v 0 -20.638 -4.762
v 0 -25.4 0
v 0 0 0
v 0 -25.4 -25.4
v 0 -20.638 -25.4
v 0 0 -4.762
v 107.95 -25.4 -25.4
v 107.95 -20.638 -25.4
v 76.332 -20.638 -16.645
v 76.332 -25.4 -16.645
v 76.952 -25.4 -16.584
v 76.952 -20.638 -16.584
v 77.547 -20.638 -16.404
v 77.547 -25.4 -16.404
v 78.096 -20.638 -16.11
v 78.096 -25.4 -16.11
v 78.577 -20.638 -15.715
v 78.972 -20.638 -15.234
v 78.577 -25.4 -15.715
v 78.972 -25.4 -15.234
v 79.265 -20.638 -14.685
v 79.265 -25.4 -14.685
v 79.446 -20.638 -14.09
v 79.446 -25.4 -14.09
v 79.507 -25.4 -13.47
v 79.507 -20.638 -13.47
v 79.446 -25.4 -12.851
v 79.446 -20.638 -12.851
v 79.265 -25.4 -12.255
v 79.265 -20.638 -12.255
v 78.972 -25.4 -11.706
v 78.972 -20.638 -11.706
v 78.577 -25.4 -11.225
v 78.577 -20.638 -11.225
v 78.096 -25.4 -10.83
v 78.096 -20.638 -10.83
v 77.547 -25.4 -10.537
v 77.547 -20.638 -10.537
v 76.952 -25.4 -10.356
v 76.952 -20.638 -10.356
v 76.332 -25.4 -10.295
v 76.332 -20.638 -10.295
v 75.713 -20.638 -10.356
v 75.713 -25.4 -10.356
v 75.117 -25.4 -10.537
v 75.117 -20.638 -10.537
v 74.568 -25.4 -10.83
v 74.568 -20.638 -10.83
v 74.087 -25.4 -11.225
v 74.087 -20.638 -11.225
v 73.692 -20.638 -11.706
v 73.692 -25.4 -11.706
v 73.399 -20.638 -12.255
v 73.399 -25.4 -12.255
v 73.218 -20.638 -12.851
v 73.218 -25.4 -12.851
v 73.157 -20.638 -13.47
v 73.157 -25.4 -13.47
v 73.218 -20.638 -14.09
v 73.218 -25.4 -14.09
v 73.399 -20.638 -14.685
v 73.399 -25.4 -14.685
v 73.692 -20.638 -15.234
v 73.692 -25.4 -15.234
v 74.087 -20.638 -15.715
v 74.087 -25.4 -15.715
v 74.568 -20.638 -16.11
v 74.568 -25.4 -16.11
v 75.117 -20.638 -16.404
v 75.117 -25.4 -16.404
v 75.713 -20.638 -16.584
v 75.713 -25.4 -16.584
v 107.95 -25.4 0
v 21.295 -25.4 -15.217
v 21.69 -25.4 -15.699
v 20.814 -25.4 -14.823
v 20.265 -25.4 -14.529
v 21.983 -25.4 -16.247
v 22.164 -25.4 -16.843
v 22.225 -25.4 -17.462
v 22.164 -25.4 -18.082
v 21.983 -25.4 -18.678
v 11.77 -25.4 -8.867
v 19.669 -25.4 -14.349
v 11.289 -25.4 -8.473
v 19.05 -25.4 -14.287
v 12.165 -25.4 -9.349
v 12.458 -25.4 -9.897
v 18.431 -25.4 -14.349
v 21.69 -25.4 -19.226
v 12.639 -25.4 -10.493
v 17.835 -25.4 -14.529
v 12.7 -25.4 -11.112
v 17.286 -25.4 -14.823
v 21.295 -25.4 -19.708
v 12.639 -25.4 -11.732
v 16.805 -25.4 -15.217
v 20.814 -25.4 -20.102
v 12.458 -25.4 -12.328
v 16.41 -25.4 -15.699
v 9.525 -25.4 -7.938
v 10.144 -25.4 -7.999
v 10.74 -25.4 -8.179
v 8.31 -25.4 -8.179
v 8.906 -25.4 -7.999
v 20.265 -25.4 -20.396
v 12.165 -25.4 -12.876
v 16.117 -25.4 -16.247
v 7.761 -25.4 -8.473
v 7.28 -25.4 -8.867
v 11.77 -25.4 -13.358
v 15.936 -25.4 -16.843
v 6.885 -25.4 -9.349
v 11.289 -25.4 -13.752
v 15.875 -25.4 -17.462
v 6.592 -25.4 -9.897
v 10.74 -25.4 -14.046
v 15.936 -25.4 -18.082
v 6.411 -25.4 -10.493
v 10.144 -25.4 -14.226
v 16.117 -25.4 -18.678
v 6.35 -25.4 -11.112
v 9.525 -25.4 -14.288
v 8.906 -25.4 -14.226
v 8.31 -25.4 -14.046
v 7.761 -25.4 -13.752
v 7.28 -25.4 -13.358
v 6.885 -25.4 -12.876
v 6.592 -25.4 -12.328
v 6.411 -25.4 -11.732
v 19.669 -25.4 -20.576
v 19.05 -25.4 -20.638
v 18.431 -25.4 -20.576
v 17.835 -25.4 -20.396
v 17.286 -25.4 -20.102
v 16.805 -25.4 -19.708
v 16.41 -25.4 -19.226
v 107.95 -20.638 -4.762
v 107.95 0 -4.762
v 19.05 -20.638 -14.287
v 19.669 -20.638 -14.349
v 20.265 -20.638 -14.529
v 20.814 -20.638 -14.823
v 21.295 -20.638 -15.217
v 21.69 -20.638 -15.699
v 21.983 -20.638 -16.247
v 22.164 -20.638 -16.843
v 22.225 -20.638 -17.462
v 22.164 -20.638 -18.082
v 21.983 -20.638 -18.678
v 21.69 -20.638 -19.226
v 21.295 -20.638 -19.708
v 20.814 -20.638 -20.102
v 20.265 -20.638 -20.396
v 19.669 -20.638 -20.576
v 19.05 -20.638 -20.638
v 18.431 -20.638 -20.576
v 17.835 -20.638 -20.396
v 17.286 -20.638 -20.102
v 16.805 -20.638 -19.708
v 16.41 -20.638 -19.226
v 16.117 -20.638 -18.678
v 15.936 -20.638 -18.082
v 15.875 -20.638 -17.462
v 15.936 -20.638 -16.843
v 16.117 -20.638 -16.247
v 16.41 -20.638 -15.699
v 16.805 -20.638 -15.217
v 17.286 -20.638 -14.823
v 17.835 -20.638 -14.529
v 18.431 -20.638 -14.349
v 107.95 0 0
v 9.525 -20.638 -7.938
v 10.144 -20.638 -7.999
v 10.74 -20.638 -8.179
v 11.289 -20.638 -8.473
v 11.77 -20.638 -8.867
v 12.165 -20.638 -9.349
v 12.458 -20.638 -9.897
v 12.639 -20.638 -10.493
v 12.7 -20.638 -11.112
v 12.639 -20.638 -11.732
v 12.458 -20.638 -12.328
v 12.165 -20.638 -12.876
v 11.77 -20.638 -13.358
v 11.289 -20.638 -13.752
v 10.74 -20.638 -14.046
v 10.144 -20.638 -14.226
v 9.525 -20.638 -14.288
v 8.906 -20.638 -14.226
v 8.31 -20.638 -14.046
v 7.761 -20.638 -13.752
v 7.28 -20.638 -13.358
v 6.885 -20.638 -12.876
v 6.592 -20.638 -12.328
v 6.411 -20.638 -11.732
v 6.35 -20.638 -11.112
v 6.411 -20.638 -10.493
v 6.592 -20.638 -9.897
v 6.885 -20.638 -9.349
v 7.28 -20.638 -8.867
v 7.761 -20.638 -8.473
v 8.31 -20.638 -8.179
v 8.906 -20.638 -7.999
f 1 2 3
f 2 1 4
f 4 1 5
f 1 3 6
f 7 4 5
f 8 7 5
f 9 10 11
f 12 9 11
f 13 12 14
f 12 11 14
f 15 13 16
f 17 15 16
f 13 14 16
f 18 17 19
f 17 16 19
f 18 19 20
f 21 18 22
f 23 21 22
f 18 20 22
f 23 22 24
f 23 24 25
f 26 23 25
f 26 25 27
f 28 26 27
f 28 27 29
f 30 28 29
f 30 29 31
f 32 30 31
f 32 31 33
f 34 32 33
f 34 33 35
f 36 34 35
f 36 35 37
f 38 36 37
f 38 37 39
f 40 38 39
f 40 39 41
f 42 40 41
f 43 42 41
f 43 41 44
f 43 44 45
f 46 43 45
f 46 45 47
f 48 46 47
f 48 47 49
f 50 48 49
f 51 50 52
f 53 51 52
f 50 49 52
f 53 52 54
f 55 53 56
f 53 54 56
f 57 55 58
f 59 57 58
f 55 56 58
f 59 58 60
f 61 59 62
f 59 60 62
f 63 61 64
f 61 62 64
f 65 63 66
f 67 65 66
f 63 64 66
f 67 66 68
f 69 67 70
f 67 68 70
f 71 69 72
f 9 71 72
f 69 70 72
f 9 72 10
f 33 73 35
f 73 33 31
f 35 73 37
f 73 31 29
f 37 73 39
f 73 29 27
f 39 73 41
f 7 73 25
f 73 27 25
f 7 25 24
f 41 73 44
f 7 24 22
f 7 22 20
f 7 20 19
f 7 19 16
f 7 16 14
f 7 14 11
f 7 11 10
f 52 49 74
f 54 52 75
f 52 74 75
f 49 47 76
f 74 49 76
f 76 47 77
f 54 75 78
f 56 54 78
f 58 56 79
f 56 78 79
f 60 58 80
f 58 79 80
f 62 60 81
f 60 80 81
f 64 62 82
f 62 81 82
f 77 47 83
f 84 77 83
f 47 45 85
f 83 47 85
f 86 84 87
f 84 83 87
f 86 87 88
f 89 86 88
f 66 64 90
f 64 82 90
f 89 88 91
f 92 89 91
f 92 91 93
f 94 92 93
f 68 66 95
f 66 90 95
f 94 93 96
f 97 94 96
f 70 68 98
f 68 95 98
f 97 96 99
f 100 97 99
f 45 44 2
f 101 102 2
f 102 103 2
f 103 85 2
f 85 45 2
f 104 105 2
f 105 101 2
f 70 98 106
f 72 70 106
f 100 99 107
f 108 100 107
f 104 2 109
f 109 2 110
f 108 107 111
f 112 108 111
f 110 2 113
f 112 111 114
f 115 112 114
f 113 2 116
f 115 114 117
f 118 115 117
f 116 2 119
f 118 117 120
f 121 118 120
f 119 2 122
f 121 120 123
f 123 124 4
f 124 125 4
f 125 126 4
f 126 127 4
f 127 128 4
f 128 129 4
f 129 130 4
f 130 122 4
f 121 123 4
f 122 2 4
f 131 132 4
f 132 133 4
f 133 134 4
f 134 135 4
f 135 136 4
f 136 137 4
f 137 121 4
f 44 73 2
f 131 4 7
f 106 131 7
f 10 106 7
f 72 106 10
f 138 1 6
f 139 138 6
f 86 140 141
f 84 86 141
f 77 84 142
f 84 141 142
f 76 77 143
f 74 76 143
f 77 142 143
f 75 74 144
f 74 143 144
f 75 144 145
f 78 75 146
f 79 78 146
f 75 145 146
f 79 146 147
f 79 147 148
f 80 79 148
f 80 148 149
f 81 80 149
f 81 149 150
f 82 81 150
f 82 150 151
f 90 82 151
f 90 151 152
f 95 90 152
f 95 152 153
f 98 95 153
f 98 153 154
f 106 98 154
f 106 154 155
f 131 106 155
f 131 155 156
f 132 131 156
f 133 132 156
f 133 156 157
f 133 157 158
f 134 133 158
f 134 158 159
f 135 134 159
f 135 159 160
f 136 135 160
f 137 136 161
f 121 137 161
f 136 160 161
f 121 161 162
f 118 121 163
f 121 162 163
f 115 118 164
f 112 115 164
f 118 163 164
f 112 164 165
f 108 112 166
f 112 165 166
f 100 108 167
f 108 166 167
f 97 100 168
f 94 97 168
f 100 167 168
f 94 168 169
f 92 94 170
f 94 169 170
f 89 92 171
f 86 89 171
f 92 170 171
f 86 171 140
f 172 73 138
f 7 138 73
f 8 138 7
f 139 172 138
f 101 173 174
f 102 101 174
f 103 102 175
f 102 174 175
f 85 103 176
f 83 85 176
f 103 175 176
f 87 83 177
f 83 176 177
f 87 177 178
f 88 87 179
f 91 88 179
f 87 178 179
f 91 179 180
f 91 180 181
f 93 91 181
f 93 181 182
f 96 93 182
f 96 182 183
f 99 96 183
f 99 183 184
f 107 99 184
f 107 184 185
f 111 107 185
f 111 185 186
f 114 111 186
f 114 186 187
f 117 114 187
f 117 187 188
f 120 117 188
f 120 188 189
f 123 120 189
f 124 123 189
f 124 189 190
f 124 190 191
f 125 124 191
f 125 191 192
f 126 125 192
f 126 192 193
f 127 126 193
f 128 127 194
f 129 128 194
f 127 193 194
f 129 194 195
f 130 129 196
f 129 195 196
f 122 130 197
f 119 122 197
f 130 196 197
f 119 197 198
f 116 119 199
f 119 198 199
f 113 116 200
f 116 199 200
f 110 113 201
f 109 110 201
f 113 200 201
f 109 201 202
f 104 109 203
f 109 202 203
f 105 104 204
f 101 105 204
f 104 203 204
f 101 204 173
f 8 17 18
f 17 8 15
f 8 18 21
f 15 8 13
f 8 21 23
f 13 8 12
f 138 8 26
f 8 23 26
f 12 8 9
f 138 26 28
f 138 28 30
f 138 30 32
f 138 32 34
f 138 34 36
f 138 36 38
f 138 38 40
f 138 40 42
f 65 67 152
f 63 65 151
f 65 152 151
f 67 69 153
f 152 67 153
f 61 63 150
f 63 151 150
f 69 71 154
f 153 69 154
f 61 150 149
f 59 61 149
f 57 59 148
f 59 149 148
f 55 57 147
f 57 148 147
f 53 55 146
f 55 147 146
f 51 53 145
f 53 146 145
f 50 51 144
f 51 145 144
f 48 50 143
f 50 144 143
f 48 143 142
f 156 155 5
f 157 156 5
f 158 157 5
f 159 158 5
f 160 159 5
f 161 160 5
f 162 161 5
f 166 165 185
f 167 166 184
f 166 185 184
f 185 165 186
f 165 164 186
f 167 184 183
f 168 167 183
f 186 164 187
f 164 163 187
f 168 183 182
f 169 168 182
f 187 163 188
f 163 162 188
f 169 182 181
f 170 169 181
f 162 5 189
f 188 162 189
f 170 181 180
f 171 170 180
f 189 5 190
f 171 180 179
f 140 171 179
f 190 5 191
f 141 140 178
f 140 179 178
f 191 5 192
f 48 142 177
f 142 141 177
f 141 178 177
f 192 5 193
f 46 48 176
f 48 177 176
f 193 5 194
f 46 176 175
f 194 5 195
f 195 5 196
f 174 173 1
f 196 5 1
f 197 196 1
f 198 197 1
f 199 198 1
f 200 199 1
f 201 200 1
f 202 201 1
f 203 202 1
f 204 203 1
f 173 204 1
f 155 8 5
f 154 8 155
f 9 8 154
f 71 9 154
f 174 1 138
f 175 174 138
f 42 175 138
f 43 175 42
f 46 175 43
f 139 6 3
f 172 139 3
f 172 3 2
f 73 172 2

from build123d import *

# Parameters (mm, degrees)
BOSS_EXTRUDE1_DEPTH = 107.95
CUT_EXTRUDE1_REACH  = 114.802
SKETCH2_R           = 3.175
CUT_EXTRUDE2_REACH  = 115.77
SKETCH3_R           = 3.175


with BuildPart() as part:
    # Sketch1 → Boss-Extrude1 (new body)
    with BuildSketch(Plane(origin=(0, 0, 0), x_dir=(0, 0, -1), z_dir=(1, 0, 0))):
        Polygon((0, 0), (0, -25.4), (25.4, -25.4), (25.4, -20.6375), (4.7625, -20.6375), (4.7625, 0), align=None)
    extrude(amount=BOSS_EXTRUDE1_DEPTH)

    # Sketch2 → Cut-Extrude1 (cut, up to next)
    with BuildSketch(Plane(origin=(0, -20.6375, 0), x_dir=(1, 0, 0), z_dir=(0, 1, 0)), mode=Mode.PRIVATE) as cut_extrude1_sk1:
        with Locations(Location((9.525, 11.1125, 0), (0, 0, 270))):
            Circle(SKETCH2_R)
    cut_extrude1_tool1 = extrude(cut_extrude1_sk1.sketch, amount=-CUT_EXTRUDE1_REACH, mode=Mode.PRIVATE) & part.part
    # Sketch2 → Cut-Extrude1 (cut, up to next)
    with BuildSketch(Plane(origin=(0, -20.6375, 0), x_dir=(1, 0, 0), z_dir=(0, 1, 0)), mode=Mode.PRIVATE) as cut_extrude1_sk2:
        with Locations(Location((19.05, 17.4625, 0), (0, 0, 270))):
            Circle(SKETCH2_R)
    cut_extrude1_tool2 = extrude(cut_extrude1_sk2.sketch, amount=-CUT_EXTRUDE1_REACH, mode=Mode.PRIVATE) & part.part
    add(cut_extrude1_tool1.solids().sort_by_distance((9.525, -20.6375, -11.1125))[0], mode=Mode.SUBTRACT)
    add(cut_extrude1_tool2.solids().sort_by_distance((19.05, -20.6375, -17.4625))[0], mode=Mode.SUBTRACT)

    # Sketch3 → Cut-Extrude2 (cut, up to next)
    with BuildSketch(Plane.XZ.offset(25.4), mode=Mode.PRIVATE) as cut_extrude2_sk1:
        with Locations(Location((76.332177029, -13.470384182, 0), (0, 0, 270))):
            Circle(SKETCH3_R)
    cut_extrude2_tool1 = extrude(cut_extrude2_sk1.sketch, amount=-CUT_EXTRUDE2_REACH, mode=Mode.PRIVATE) & part.part
    add(cut_extrude2_tool1.solids().sort_by_distance((76.332177, -25.4, -13.470384))[0], mode=Mode.SUBTRACT)


solid = part.part
